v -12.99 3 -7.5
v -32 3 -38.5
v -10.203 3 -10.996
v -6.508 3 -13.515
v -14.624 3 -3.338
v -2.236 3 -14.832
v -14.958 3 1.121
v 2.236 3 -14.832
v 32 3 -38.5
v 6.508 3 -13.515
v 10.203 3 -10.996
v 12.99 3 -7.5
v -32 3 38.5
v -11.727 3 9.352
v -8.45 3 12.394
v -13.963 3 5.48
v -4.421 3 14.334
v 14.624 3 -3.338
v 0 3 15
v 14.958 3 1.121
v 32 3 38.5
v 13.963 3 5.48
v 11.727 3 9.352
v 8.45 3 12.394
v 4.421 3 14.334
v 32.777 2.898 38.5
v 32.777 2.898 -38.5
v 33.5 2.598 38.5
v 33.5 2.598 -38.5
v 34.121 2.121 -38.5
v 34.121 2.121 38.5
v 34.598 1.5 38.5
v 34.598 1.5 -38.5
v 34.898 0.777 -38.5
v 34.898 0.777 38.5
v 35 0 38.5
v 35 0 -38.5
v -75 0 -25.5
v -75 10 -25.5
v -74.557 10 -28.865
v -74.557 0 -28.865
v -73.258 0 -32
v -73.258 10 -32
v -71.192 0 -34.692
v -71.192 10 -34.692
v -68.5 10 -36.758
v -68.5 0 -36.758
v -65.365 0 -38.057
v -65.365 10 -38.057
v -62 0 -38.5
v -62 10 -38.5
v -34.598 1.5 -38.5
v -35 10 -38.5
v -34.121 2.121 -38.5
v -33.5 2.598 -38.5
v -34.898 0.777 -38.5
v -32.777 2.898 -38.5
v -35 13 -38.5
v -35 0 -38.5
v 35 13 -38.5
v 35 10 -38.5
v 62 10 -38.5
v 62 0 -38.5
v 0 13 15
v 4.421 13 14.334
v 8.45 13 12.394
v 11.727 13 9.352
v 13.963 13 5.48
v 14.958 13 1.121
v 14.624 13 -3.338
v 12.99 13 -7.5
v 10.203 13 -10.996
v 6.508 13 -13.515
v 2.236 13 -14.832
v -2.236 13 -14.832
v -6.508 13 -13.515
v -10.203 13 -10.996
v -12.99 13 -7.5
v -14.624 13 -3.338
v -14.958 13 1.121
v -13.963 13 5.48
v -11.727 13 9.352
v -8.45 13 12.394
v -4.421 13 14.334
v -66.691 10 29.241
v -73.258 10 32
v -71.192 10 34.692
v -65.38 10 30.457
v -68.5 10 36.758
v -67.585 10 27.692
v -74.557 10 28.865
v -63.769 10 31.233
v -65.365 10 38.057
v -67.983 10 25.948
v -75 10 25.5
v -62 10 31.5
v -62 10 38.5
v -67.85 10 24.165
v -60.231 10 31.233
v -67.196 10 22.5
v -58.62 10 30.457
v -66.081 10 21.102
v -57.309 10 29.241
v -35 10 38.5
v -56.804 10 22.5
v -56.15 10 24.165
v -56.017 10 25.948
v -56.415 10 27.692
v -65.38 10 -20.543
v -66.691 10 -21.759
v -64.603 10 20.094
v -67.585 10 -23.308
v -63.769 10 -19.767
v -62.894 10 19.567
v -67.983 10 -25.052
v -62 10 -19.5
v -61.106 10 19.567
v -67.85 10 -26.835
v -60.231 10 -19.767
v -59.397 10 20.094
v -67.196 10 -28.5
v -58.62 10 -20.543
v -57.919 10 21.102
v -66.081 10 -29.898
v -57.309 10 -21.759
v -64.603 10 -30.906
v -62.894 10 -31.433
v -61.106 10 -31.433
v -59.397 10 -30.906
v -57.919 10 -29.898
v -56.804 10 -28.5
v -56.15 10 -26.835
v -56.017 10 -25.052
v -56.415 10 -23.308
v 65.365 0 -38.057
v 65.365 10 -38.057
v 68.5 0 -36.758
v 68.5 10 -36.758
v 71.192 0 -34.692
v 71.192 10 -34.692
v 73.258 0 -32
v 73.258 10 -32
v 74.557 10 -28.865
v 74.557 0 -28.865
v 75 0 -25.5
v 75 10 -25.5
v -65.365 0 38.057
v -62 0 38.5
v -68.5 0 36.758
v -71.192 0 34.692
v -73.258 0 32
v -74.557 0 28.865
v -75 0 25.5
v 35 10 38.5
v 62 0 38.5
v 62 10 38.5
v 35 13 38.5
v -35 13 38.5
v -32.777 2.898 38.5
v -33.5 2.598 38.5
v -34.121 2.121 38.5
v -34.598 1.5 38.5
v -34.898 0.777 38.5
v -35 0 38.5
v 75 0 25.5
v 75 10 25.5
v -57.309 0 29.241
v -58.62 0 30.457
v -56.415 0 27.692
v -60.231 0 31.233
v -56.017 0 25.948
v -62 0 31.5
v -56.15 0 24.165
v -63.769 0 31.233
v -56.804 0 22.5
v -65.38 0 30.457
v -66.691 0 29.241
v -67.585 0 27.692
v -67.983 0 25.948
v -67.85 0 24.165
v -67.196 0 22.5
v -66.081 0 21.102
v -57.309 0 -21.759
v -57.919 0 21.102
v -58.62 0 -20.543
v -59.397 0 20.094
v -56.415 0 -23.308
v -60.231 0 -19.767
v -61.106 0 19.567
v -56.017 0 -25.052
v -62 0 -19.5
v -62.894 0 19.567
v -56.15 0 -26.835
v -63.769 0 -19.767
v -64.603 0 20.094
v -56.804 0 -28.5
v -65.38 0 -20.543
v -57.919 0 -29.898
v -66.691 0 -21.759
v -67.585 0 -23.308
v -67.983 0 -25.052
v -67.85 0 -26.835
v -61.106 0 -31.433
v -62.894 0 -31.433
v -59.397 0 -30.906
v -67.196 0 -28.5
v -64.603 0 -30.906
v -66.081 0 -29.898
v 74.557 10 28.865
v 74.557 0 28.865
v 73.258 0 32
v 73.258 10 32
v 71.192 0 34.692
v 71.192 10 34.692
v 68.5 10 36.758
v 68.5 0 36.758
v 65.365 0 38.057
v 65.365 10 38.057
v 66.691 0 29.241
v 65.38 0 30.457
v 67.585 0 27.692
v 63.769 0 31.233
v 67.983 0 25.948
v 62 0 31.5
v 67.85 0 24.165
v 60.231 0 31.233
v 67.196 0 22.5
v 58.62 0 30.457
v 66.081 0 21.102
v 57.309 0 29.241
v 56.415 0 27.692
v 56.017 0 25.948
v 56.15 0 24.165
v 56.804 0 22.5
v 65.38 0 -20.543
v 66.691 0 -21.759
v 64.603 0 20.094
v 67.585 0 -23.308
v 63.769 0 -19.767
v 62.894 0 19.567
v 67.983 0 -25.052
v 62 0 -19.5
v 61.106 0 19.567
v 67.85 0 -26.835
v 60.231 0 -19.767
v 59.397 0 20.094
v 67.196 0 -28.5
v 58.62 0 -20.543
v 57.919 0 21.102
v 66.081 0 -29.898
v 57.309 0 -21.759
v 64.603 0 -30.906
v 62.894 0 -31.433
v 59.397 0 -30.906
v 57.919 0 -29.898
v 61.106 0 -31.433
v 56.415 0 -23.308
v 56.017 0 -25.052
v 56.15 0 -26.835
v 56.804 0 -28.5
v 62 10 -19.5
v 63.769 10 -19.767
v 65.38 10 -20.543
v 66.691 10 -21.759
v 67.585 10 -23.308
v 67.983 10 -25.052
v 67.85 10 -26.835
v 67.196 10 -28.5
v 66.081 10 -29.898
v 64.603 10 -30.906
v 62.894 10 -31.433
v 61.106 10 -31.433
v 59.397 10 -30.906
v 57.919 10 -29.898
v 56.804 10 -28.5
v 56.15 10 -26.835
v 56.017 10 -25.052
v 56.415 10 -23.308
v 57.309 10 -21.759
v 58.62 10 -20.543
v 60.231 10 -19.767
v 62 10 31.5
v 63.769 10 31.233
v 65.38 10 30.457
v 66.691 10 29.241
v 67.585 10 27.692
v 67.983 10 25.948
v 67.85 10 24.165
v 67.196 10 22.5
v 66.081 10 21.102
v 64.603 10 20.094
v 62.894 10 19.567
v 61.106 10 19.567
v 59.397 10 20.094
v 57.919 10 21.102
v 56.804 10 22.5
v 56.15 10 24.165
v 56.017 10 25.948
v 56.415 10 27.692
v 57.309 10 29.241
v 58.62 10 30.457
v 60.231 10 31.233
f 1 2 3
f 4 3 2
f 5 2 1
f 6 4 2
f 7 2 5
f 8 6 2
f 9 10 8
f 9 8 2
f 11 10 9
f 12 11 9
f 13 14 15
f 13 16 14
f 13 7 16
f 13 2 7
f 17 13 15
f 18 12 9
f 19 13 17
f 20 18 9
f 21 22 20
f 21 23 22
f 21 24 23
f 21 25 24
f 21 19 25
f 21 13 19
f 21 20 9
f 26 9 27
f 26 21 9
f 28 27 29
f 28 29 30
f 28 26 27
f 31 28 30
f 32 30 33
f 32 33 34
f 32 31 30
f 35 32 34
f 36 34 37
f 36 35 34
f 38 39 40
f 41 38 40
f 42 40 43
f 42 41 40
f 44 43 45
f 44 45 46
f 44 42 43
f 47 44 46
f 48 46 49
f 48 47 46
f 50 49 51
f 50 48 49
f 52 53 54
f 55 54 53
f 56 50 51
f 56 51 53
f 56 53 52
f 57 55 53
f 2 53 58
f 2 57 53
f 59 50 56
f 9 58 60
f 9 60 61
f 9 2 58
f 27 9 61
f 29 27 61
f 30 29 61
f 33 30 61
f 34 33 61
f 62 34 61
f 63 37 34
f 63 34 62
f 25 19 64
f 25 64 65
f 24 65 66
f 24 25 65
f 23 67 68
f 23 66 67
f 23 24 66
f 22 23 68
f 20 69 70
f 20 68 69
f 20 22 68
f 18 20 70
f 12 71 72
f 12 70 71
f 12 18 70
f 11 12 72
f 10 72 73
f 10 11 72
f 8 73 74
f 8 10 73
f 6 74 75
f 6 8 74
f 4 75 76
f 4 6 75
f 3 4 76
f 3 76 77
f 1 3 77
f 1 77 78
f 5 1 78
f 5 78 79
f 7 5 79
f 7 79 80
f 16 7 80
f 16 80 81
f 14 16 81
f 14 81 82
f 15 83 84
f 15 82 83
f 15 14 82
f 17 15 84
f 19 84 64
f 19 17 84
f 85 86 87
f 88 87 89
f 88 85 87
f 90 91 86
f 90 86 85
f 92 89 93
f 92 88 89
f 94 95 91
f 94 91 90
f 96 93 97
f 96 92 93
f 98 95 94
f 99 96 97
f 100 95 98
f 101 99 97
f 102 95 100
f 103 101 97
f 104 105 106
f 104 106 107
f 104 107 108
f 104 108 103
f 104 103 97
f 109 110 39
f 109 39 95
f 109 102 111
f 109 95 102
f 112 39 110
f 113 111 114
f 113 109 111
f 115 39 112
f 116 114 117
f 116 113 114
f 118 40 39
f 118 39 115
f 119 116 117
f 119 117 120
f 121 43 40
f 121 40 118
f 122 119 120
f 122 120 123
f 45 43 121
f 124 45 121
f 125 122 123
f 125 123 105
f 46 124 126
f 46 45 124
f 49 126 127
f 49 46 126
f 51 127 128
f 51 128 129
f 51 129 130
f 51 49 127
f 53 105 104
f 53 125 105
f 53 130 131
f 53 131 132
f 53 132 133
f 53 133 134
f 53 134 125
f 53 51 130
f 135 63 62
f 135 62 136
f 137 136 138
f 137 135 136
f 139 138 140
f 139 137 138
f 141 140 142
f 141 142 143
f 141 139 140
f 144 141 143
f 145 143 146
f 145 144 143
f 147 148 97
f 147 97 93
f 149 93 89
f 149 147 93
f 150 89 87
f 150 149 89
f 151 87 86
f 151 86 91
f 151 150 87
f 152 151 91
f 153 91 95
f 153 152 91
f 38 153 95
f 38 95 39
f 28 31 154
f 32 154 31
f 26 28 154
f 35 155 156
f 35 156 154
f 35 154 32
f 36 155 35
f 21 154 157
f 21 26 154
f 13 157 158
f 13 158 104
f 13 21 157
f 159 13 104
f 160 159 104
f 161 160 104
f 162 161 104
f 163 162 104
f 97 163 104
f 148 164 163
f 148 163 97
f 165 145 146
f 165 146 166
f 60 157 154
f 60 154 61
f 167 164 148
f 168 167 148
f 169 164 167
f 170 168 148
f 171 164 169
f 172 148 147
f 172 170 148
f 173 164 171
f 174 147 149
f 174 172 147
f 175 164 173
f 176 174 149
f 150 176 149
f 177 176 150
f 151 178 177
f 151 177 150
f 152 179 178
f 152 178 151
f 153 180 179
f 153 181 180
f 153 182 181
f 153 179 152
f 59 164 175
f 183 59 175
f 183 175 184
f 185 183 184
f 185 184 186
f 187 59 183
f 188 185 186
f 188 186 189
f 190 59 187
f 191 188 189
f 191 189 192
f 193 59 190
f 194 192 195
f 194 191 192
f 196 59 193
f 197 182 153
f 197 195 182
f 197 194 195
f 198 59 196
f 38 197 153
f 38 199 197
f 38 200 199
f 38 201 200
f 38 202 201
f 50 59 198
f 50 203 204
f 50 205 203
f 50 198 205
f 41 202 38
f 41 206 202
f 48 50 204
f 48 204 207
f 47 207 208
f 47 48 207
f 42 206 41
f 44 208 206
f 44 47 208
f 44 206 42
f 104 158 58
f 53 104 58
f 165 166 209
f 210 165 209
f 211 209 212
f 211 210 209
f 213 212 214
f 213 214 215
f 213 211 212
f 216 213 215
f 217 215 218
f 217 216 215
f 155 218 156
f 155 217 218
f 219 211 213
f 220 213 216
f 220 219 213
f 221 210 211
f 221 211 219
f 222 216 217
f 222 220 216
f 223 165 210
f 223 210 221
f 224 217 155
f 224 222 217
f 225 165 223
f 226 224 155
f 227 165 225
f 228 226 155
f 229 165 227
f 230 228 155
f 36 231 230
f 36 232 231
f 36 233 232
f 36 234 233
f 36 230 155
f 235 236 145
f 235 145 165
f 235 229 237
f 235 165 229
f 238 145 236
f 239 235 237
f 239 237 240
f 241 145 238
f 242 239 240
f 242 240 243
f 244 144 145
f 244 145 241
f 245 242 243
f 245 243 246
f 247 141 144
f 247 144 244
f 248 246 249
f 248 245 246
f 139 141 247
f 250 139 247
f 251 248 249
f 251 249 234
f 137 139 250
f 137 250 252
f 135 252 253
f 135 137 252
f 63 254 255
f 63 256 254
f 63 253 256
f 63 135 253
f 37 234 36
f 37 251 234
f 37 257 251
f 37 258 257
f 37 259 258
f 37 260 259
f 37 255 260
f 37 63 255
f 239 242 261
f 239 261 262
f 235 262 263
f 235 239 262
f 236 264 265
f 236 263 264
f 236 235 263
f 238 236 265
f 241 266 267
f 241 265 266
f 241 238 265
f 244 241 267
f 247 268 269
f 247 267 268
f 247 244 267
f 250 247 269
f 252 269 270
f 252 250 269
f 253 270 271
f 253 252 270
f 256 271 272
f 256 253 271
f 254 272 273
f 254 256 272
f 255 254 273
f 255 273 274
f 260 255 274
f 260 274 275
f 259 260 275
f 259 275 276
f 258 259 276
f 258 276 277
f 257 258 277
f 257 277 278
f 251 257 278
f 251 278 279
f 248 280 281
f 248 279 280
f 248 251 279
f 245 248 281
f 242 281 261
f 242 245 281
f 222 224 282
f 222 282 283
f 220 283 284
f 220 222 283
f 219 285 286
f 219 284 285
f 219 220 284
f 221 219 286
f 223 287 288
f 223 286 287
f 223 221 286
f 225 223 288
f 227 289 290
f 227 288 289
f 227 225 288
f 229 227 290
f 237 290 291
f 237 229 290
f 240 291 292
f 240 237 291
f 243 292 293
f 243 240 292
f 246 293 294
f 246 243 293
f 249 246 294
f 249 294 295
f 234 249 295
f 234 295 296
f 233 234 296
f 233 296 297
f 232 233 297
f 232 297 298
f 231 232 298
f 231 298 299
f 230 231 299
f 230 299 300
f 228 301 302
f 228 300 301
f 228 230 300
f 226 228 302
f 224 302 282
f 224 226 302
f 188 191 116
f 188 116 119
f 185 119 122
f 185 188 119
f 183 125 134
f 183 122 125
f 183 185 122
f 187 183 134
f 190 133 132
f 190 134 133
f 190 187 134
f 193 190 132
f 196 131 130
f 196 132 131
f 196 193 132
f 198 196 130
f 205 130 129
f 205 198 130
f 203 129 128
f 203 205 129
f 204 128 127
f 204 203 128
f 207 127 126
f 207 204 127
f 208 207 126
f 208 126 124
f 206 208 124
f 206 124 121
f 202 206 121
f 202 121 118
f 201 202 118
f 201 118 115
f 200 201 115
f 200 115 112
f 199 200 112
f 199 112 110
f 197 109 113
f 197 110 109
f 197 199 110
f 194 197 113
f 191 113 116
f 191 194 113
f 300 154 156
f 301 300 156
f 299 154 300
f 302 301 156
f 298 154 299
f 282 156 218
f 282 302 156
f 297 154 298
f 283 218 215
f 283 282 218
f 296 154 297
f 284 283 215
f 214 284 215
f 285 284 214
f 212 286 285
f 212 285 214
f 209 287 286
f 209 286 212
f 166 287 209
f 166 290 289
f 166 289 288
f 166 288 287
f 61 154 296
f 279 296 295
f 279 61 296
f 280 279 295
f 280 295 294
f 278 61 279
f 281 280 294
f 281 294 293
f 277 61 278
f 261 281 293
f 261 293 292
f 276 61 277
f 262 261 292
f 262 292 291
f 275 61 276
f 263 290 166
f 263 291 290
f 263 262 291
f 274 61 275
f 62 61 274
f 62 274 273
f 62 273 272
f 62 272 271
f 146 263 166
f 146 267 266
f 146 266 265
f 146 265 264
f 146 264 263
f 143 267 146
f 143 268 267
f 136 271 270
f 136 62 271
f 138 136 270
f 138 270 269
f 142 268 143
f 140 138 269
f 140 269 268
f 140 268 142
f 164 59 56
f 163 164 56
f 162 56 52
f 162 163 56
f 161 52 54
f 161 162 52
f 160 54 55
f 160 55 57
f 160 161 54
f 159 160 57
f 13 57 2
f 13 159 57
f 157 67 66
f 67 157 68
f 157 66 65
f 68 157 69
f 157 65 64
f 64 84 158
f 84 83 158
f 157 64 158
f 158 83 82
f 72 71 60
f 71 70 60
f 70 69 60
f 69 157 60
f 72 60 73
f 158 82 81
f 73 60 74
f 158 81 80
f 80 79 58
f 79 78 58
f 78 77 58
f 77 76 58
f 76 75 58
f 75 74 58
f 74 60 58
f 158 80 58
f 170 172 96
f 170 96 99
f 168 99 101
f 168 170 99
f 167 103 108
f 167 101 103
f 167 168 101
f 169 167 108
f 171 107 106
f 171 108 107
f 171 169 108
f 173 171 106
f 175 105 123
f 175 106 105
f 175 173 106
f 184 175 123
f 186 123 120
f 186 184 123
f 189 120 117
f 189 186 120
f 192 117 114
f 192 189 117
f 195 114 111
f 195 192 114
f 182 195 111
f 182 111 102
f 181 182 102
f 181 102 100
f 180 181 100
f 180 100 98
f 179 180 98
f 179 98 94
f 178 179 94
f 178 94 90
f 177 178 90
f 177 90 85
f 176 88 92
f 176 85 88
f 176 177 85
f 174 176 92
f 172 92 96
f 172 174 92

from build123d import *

# Parameters (mm, degrees)
EXTRUDE_2_DEPTH          = 13
CUT_EXTRUDE_2_DEPTH      = 86.300937861
CUT_EXTRUDE_2_DEPTH_BACK = 86.300937861
SKETCH_2_R               = 6
SKETCH_2_R_2             = 15
SKETCH_3_W               = 100
SKETCH_3_H               = 100
CUT_EXTRUDE_3_DEPTH      = 3
SKETCH_4_W               = 70
SKETCH_4_H               = 77
CUT_EXTRUDE_4_DEPTH      = 3
FILLET_1_R               = 3


with BuildPart() as part:
    # 스케치1 → 보스-돌출2 (new body)
    with BuildSketch(Plane(origin=(0, 0, 0), x_dir=(1, 0, 0), z_dir=(0, 1, 0))):
        with BuildLine():
            Line((-62, 38.5), (62, 38.5))
            ThreePointArc((62, 38.5), (71.192388155, 34.692388155), (75, 25.5))
            Line((75, 25.5), (75, -25.5))
            ThreePointArc((75, -25.5), (71.192388155, -34.692388155), (62, -38.5))
            Line((62, -38.5), (-62, -38.5))
            ThreePointArc((-62, -38.5), (-71.192388155, -34.692388155), (-75, -25.5))
            Line((-75, -25.5), (-75, 25.5))
            ThreePointArc((-75, 25.5), (-71.192388155, 34.692388155), (-62, 38.5))
        make_face()
    extrude(amount=EXTRUDE_2_DEPTH)

    # 스케치2 → 컷-돌출2 (cut, two sides: drawn at the far end of the back side and taken through both)
    with BuildSketch(Plane(origin=(0, 0, 0), x_dir=(1, 0, 0), z_dir=(0, 1, 0)).offset(-CUT_EXTRUDE_2_DEPTH_BACK)):
        with Locations(Location((-62, 25.5, 0), (0, 0, 270))):
            Circle(SKETCH_2_R)
        with Locations(Location((-62, -25.5, 0), (0, 0, 270))):
            Circle(SKETCH_2_R)
        with Locations(Location((62, -25.5, 0), (0, 0, 270))):
            Circle(SKETCH_2_R)
        with Locations(Location((62, 25.5, 0), (0, 0, 270))):
            Circle(SKETCH_2_R)
        with Locations(Location((0, 0, 0), (0, 0, 270))):
            Circle(SKETCH_2_R_2)
    extrude(amount=CUT_EXTRUDE_2_DEPTH + CUT_EXTRUDE_2_DEPTH_BACK, mode=Mode.SUBTRACT)

    # 스케치3 → 컷-돌출3 (cut)
    with BuildSketch(Plane(origin=(0, 13, 0), x_dir=(1, 0, 0), z_dir=(0, 1, 0))):
        with Locations((85, 0)):
            Rectangle(SKETCH_3_W, SKETCH_3_H)
        with Locations((-85, 0)):
            Rectangle(SKETCH_3_W, SKETCH_3_H)
    extrude(amount=-CUT_EXTRUDE_3_DEPTH, mode=Mode.SUBTRACT)

    # 스케치4 → 컷-돌출4 (cut)
    with BuildSketch(Plane.XZ):
        Rectangle(SKETCH_4_W, SKETCH_4_H)
    extrude(amount=-CUT_EXTRUDE_4_DEPTH, mode=Mode.SUBTRACT)

    # 필렛1
    fillet_1_edges = [part.edges().sort_by_distance(p)[0] for p in [
        (-35, 3, 0),
        (35, 3, 0),
    ]]
    fillet(fillet_1_edges, radius=FILLET_1_R - 0.0001)  # a hair under: the kernel refuses the full size


solid = part.part
